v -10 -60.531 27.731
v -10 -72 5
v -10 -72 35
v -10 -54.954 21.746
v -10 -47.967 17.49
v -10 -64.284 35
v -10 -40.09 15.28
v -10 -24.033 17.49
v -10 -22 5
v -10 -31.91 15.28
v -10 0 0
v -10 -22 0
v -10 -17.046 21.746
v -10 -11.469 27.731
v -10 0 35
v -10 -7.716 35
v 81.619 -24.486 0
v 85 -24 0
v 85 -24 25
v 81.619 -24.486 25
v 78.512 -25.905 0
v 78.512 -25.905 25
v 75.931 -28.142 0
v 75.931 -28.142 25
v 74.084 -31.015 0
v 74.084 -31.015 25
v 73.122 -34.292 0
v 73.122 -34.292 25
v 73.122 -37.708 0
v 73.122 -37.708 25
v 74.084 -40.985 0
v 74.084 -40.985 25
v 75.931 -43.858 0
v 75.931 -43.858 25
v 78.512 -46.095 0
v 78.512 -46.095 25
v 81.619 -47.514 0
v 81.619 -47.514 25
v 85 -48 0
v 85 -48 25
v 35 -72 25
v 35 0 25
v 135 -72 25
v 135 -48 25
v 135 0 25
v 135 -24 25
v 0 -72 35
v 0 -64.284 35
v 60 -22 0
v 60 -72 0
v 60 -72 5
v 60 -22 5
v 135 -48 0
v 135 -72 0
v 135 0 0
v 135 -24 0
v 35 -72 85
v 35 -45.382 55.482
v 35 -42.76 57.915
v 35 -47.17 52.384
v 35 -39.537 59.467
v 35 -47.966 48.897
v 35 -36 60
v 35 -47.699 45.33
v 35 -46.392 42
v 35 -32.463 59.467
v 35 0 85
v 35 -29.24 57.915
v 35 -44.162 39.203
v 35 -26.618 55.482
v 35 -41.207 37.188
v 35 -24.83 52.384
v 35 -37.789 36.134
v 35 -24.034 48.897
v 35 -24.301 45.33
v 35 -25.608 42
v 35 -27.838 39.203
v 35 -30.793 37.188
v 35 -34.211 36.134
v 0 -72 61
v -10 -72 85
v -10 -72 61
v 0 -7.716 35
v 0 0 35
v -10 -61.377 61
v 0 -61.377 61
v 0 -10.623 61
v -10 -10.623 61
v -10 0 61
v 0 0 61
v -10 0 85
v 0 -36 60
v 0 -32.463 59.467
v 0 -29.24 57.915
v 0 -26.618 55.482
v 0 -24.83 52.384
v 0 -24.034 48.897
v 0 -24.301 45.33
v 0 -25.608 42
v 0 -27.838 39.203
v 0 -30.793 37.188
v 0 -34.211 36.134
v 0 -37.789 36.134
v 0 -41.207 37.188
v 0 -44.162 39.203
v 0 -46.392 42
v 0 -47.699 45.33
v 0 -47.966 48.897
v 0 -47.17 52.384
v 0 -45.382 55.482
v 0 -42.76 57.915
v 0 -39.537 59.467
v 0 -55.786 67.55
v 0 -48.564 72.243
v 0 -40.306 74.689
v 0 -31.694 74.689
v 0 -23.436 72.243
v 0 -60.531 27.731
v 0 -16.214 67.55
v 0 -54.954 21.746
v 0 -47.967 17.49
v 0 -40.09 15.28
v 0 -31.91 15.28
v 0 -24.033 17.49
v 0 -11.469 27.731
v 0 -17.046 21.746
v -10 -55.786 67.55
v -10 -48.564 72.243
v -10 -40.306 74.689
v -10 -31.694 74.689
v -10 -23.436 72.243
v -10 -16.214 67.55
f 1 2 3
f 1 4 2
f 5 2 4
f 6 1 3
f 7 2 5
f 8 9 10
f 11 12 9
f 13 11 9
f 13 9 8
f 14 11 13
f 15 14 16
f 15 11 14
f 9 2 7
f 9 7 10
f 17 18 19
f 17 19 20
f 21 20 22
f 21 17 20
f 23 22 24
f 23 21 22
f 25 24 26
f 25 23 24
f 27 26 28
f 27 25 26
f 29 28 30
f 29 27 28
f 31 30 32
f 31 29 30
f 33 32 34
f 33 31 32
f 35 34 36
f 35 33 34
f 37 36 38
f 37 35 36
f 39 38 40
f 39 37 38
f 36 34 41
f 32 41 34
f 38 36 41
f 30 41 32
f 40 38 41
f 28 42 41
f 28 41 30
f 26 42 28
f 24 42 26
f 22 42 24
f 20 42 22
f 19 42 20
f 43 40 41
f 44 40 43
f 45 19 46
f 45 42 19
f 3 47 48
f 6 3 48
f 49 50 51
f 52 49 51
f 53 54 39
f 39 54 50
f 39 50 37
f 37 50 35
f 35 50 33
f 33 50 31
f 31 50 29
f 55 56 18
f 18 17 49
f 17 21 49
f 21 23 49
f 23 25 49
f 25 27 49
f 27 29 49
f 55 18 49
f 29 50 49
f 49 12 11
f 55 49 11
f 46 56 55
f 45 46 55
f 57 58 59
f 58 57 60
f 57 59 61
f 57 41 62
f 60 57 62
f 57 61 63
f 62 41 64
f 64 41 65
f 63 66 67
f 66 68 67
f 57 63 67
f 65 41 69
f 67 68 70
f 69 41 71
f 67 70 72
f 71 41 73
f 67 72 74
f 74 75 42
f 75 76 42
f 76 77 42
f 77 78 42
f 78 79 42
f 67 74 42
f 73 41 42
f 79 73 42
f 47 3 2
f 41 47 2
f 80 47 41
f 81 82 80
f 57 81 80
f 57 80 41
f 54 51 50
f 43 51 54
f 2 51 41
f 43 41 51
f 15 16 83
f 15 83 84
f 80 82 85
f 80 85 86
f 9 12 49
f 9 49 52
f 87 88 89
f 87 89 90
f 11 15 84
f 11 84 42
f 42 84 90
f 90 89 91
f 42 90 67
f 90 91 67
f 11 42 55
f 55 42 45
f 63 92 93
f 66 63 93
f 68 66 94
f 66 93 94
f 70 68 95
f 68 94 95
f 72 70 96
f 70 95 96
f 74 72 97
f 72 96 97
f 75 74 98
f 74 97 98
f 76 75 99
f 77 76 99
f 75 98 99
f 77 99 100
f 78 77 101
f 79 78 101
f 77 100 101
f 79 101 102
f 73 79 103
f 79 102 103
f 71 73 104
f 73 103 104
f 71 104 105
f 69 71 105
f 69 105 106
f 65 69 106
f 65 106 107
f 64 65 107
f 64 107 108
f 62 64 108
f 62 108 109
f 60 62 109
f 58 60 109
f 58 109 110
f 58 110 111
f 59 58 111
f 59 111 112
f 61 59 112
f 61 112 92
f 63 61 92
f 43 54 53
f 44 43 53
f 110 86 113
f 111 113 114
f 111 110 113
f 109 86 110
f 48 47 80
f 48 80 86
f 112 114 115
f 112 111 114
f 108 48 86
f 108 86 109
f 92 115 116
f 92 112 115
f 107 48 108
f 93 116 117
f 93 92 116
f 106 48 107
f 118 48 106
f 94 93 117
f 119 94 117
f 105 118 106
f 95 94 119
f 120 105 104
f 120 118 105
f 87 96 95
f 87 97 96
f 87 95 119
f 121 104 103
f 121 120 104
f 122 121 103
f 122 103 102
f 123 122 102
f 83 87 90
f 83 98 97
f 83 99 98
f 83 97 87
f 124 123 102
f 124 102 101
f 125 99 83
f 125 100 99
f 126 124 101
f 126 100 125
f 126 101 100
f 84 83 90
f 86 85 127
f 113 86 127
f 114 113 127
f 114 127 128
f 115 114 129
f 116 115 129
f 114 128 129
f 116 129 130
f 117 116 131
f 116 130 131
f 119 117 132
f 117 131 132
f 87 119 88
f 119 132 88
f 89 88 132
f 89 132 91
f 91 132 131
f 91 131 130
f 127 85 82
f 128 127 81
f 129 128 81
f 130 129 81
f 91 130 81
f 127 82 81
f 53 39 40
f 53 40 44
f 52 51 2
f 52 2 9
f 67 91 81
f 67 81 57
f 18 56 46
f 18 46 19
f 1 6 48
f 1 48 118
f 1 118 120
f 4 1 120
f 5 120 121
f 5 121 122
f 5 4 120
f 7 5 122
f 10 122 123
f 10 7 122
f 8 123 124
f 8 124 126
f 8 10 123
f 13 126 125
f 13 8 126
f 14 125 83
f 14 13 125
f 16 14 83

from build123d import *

# Parameters (mm, degrees)
SKETCH1_W           = 135
SKETCH1_H           = 72
BOSS_EXTRUDE2_DEPTH = 25
SKETCH2_W           = 60
SKETCH2_H           = 5
CUT_EXTRUDE1_DEPTH  = 72
CUT_EXTRUDE2_DEPTH  = 153
SKETCH4_W           = 30
SKETCH4_H           = 72
BOSS_EXTRUDE3_DEPTH = 10
SKETCH7_W           = 5
SKETCH7_H           = 22
BOSS_EXTRUDE4_DEPTH = 70
SKETCH9_W           = 35
SKETCH9_H           = 72
BOSS_EXTRUDE5_DEPTH = 60
SKETCH10_W          = 10
SKETCH10_H          = 24
BOSS_EXTRUDE6_DEPTH = 72
CUT_EXTRUDE3_DEPTH  = 10
SKETCH12_R          = 12
CUT_EXTRUDE4_DEPTH  = 42


with BuildPart() as part:
    # Sketch1 → Boss-Extrude2 (new body)
    with BuildSketch(Plane.XY):
        with Locations((67.5, -36)):
            Rectangle(SKETCH1_W, SKETCH1_H)
    extrude(amount=BOSS_EXTRUDE2_DEPTH)

    # Sketch2 → Cut-Extrude1 (cut)
    with BuildSketch(Plane.XZ.offset(72)):
        with Locations((30, 2.5)):
            Rectangle(SKETCH2_W, SKETCH2_H)
    extrude(amount=-CUT_EXTRUDE1_DEPTH, mode=Mode.SUBTRACT)

    # Sketch3 → Cut-Extrude2 (cut)
    with BuildSketch(Plane.XY):
        with BuildLine():
            Line((135, -24), (85, -24))
            ThreePointArc((85, -24), (73, -36), (85, -48))
            Line((85, -48), (135, -48))
            Line((135, -48), (135, -24))
        make_face()
    extrude(amount=CUT_EXTRUDE2_DEPTH, mode=Mode.SUBTRACT)

    # Sketch4 → Boss-Extrude3 (add)
    with BuildSketch(Plane.ZY):
        with Locations((20, -36)):
            Rectangle(SKETCH4_W, SKETCH4_H)
    extrude(amount=BOSS_EXTRUDE3_DEPTH)

    # Sketch7 → Boss-Extrude4 (add)
    with BuildSketch(Plane.ZY.offset(10)):
        with Locations((2.5, -11)):
            Rectangle(SKETCH7_W, SKETCH7_H)
    extrude(amount=-BOSS_EXTRUDE4_DEPTH)

    # Sketch9 → Boss-Extrude5 (add)
    with BuildSketch(Plane.XY.offset(25)):
        with Locations((17.5, -36)):
            Rectangle(SKETCH9_W, SKETCH9_H)
    extrude(amount=BOSS_EXTRUDE5_DEPTH)

    # Sketch10 → Boss-Extrude6 (add)
    with BuildSketch(Plane.XZ.offset(72)):
        with Locations((-5, 73)):
            Rectangle(SKETCH10_W, SKETCH10_H)
    extrude(amount=-BOSS_EXTRUDE6_DEPTH)

    # Sketch11 → Cut-Extrude3 (cut)
    with BuildSketch(Plane.ZY.offset(10)):
        with BuildLine():
            Line((35, -7.715728753), (35, -64.284271247))
            ThreePointArc((35, -64.284271247), (15, -36), (35, -7.715728753))
        make_face()
        with BuildLine():
            Line((61, -10.622844919), (61, -61.377155081))
            ThreePointArc((61, -61.377155081), (75, -36), (61, -10.622844919))
        make_face()
    extrude(amount=-CUT_EXTRUDE3_DEPTH, mode=Mode.SUBTRACT)

    # Sketch12 → Cut-Extrude4 (cut)
    with BuildSketch(Plane.ZY):
        with Locations((48, -36)):
            Circle(SKETCH12_R)
    extrude(amount=-CUT_EXTRUDE4_DEPTH, mode=Mode.SUBTRACT)


solid = part.part
